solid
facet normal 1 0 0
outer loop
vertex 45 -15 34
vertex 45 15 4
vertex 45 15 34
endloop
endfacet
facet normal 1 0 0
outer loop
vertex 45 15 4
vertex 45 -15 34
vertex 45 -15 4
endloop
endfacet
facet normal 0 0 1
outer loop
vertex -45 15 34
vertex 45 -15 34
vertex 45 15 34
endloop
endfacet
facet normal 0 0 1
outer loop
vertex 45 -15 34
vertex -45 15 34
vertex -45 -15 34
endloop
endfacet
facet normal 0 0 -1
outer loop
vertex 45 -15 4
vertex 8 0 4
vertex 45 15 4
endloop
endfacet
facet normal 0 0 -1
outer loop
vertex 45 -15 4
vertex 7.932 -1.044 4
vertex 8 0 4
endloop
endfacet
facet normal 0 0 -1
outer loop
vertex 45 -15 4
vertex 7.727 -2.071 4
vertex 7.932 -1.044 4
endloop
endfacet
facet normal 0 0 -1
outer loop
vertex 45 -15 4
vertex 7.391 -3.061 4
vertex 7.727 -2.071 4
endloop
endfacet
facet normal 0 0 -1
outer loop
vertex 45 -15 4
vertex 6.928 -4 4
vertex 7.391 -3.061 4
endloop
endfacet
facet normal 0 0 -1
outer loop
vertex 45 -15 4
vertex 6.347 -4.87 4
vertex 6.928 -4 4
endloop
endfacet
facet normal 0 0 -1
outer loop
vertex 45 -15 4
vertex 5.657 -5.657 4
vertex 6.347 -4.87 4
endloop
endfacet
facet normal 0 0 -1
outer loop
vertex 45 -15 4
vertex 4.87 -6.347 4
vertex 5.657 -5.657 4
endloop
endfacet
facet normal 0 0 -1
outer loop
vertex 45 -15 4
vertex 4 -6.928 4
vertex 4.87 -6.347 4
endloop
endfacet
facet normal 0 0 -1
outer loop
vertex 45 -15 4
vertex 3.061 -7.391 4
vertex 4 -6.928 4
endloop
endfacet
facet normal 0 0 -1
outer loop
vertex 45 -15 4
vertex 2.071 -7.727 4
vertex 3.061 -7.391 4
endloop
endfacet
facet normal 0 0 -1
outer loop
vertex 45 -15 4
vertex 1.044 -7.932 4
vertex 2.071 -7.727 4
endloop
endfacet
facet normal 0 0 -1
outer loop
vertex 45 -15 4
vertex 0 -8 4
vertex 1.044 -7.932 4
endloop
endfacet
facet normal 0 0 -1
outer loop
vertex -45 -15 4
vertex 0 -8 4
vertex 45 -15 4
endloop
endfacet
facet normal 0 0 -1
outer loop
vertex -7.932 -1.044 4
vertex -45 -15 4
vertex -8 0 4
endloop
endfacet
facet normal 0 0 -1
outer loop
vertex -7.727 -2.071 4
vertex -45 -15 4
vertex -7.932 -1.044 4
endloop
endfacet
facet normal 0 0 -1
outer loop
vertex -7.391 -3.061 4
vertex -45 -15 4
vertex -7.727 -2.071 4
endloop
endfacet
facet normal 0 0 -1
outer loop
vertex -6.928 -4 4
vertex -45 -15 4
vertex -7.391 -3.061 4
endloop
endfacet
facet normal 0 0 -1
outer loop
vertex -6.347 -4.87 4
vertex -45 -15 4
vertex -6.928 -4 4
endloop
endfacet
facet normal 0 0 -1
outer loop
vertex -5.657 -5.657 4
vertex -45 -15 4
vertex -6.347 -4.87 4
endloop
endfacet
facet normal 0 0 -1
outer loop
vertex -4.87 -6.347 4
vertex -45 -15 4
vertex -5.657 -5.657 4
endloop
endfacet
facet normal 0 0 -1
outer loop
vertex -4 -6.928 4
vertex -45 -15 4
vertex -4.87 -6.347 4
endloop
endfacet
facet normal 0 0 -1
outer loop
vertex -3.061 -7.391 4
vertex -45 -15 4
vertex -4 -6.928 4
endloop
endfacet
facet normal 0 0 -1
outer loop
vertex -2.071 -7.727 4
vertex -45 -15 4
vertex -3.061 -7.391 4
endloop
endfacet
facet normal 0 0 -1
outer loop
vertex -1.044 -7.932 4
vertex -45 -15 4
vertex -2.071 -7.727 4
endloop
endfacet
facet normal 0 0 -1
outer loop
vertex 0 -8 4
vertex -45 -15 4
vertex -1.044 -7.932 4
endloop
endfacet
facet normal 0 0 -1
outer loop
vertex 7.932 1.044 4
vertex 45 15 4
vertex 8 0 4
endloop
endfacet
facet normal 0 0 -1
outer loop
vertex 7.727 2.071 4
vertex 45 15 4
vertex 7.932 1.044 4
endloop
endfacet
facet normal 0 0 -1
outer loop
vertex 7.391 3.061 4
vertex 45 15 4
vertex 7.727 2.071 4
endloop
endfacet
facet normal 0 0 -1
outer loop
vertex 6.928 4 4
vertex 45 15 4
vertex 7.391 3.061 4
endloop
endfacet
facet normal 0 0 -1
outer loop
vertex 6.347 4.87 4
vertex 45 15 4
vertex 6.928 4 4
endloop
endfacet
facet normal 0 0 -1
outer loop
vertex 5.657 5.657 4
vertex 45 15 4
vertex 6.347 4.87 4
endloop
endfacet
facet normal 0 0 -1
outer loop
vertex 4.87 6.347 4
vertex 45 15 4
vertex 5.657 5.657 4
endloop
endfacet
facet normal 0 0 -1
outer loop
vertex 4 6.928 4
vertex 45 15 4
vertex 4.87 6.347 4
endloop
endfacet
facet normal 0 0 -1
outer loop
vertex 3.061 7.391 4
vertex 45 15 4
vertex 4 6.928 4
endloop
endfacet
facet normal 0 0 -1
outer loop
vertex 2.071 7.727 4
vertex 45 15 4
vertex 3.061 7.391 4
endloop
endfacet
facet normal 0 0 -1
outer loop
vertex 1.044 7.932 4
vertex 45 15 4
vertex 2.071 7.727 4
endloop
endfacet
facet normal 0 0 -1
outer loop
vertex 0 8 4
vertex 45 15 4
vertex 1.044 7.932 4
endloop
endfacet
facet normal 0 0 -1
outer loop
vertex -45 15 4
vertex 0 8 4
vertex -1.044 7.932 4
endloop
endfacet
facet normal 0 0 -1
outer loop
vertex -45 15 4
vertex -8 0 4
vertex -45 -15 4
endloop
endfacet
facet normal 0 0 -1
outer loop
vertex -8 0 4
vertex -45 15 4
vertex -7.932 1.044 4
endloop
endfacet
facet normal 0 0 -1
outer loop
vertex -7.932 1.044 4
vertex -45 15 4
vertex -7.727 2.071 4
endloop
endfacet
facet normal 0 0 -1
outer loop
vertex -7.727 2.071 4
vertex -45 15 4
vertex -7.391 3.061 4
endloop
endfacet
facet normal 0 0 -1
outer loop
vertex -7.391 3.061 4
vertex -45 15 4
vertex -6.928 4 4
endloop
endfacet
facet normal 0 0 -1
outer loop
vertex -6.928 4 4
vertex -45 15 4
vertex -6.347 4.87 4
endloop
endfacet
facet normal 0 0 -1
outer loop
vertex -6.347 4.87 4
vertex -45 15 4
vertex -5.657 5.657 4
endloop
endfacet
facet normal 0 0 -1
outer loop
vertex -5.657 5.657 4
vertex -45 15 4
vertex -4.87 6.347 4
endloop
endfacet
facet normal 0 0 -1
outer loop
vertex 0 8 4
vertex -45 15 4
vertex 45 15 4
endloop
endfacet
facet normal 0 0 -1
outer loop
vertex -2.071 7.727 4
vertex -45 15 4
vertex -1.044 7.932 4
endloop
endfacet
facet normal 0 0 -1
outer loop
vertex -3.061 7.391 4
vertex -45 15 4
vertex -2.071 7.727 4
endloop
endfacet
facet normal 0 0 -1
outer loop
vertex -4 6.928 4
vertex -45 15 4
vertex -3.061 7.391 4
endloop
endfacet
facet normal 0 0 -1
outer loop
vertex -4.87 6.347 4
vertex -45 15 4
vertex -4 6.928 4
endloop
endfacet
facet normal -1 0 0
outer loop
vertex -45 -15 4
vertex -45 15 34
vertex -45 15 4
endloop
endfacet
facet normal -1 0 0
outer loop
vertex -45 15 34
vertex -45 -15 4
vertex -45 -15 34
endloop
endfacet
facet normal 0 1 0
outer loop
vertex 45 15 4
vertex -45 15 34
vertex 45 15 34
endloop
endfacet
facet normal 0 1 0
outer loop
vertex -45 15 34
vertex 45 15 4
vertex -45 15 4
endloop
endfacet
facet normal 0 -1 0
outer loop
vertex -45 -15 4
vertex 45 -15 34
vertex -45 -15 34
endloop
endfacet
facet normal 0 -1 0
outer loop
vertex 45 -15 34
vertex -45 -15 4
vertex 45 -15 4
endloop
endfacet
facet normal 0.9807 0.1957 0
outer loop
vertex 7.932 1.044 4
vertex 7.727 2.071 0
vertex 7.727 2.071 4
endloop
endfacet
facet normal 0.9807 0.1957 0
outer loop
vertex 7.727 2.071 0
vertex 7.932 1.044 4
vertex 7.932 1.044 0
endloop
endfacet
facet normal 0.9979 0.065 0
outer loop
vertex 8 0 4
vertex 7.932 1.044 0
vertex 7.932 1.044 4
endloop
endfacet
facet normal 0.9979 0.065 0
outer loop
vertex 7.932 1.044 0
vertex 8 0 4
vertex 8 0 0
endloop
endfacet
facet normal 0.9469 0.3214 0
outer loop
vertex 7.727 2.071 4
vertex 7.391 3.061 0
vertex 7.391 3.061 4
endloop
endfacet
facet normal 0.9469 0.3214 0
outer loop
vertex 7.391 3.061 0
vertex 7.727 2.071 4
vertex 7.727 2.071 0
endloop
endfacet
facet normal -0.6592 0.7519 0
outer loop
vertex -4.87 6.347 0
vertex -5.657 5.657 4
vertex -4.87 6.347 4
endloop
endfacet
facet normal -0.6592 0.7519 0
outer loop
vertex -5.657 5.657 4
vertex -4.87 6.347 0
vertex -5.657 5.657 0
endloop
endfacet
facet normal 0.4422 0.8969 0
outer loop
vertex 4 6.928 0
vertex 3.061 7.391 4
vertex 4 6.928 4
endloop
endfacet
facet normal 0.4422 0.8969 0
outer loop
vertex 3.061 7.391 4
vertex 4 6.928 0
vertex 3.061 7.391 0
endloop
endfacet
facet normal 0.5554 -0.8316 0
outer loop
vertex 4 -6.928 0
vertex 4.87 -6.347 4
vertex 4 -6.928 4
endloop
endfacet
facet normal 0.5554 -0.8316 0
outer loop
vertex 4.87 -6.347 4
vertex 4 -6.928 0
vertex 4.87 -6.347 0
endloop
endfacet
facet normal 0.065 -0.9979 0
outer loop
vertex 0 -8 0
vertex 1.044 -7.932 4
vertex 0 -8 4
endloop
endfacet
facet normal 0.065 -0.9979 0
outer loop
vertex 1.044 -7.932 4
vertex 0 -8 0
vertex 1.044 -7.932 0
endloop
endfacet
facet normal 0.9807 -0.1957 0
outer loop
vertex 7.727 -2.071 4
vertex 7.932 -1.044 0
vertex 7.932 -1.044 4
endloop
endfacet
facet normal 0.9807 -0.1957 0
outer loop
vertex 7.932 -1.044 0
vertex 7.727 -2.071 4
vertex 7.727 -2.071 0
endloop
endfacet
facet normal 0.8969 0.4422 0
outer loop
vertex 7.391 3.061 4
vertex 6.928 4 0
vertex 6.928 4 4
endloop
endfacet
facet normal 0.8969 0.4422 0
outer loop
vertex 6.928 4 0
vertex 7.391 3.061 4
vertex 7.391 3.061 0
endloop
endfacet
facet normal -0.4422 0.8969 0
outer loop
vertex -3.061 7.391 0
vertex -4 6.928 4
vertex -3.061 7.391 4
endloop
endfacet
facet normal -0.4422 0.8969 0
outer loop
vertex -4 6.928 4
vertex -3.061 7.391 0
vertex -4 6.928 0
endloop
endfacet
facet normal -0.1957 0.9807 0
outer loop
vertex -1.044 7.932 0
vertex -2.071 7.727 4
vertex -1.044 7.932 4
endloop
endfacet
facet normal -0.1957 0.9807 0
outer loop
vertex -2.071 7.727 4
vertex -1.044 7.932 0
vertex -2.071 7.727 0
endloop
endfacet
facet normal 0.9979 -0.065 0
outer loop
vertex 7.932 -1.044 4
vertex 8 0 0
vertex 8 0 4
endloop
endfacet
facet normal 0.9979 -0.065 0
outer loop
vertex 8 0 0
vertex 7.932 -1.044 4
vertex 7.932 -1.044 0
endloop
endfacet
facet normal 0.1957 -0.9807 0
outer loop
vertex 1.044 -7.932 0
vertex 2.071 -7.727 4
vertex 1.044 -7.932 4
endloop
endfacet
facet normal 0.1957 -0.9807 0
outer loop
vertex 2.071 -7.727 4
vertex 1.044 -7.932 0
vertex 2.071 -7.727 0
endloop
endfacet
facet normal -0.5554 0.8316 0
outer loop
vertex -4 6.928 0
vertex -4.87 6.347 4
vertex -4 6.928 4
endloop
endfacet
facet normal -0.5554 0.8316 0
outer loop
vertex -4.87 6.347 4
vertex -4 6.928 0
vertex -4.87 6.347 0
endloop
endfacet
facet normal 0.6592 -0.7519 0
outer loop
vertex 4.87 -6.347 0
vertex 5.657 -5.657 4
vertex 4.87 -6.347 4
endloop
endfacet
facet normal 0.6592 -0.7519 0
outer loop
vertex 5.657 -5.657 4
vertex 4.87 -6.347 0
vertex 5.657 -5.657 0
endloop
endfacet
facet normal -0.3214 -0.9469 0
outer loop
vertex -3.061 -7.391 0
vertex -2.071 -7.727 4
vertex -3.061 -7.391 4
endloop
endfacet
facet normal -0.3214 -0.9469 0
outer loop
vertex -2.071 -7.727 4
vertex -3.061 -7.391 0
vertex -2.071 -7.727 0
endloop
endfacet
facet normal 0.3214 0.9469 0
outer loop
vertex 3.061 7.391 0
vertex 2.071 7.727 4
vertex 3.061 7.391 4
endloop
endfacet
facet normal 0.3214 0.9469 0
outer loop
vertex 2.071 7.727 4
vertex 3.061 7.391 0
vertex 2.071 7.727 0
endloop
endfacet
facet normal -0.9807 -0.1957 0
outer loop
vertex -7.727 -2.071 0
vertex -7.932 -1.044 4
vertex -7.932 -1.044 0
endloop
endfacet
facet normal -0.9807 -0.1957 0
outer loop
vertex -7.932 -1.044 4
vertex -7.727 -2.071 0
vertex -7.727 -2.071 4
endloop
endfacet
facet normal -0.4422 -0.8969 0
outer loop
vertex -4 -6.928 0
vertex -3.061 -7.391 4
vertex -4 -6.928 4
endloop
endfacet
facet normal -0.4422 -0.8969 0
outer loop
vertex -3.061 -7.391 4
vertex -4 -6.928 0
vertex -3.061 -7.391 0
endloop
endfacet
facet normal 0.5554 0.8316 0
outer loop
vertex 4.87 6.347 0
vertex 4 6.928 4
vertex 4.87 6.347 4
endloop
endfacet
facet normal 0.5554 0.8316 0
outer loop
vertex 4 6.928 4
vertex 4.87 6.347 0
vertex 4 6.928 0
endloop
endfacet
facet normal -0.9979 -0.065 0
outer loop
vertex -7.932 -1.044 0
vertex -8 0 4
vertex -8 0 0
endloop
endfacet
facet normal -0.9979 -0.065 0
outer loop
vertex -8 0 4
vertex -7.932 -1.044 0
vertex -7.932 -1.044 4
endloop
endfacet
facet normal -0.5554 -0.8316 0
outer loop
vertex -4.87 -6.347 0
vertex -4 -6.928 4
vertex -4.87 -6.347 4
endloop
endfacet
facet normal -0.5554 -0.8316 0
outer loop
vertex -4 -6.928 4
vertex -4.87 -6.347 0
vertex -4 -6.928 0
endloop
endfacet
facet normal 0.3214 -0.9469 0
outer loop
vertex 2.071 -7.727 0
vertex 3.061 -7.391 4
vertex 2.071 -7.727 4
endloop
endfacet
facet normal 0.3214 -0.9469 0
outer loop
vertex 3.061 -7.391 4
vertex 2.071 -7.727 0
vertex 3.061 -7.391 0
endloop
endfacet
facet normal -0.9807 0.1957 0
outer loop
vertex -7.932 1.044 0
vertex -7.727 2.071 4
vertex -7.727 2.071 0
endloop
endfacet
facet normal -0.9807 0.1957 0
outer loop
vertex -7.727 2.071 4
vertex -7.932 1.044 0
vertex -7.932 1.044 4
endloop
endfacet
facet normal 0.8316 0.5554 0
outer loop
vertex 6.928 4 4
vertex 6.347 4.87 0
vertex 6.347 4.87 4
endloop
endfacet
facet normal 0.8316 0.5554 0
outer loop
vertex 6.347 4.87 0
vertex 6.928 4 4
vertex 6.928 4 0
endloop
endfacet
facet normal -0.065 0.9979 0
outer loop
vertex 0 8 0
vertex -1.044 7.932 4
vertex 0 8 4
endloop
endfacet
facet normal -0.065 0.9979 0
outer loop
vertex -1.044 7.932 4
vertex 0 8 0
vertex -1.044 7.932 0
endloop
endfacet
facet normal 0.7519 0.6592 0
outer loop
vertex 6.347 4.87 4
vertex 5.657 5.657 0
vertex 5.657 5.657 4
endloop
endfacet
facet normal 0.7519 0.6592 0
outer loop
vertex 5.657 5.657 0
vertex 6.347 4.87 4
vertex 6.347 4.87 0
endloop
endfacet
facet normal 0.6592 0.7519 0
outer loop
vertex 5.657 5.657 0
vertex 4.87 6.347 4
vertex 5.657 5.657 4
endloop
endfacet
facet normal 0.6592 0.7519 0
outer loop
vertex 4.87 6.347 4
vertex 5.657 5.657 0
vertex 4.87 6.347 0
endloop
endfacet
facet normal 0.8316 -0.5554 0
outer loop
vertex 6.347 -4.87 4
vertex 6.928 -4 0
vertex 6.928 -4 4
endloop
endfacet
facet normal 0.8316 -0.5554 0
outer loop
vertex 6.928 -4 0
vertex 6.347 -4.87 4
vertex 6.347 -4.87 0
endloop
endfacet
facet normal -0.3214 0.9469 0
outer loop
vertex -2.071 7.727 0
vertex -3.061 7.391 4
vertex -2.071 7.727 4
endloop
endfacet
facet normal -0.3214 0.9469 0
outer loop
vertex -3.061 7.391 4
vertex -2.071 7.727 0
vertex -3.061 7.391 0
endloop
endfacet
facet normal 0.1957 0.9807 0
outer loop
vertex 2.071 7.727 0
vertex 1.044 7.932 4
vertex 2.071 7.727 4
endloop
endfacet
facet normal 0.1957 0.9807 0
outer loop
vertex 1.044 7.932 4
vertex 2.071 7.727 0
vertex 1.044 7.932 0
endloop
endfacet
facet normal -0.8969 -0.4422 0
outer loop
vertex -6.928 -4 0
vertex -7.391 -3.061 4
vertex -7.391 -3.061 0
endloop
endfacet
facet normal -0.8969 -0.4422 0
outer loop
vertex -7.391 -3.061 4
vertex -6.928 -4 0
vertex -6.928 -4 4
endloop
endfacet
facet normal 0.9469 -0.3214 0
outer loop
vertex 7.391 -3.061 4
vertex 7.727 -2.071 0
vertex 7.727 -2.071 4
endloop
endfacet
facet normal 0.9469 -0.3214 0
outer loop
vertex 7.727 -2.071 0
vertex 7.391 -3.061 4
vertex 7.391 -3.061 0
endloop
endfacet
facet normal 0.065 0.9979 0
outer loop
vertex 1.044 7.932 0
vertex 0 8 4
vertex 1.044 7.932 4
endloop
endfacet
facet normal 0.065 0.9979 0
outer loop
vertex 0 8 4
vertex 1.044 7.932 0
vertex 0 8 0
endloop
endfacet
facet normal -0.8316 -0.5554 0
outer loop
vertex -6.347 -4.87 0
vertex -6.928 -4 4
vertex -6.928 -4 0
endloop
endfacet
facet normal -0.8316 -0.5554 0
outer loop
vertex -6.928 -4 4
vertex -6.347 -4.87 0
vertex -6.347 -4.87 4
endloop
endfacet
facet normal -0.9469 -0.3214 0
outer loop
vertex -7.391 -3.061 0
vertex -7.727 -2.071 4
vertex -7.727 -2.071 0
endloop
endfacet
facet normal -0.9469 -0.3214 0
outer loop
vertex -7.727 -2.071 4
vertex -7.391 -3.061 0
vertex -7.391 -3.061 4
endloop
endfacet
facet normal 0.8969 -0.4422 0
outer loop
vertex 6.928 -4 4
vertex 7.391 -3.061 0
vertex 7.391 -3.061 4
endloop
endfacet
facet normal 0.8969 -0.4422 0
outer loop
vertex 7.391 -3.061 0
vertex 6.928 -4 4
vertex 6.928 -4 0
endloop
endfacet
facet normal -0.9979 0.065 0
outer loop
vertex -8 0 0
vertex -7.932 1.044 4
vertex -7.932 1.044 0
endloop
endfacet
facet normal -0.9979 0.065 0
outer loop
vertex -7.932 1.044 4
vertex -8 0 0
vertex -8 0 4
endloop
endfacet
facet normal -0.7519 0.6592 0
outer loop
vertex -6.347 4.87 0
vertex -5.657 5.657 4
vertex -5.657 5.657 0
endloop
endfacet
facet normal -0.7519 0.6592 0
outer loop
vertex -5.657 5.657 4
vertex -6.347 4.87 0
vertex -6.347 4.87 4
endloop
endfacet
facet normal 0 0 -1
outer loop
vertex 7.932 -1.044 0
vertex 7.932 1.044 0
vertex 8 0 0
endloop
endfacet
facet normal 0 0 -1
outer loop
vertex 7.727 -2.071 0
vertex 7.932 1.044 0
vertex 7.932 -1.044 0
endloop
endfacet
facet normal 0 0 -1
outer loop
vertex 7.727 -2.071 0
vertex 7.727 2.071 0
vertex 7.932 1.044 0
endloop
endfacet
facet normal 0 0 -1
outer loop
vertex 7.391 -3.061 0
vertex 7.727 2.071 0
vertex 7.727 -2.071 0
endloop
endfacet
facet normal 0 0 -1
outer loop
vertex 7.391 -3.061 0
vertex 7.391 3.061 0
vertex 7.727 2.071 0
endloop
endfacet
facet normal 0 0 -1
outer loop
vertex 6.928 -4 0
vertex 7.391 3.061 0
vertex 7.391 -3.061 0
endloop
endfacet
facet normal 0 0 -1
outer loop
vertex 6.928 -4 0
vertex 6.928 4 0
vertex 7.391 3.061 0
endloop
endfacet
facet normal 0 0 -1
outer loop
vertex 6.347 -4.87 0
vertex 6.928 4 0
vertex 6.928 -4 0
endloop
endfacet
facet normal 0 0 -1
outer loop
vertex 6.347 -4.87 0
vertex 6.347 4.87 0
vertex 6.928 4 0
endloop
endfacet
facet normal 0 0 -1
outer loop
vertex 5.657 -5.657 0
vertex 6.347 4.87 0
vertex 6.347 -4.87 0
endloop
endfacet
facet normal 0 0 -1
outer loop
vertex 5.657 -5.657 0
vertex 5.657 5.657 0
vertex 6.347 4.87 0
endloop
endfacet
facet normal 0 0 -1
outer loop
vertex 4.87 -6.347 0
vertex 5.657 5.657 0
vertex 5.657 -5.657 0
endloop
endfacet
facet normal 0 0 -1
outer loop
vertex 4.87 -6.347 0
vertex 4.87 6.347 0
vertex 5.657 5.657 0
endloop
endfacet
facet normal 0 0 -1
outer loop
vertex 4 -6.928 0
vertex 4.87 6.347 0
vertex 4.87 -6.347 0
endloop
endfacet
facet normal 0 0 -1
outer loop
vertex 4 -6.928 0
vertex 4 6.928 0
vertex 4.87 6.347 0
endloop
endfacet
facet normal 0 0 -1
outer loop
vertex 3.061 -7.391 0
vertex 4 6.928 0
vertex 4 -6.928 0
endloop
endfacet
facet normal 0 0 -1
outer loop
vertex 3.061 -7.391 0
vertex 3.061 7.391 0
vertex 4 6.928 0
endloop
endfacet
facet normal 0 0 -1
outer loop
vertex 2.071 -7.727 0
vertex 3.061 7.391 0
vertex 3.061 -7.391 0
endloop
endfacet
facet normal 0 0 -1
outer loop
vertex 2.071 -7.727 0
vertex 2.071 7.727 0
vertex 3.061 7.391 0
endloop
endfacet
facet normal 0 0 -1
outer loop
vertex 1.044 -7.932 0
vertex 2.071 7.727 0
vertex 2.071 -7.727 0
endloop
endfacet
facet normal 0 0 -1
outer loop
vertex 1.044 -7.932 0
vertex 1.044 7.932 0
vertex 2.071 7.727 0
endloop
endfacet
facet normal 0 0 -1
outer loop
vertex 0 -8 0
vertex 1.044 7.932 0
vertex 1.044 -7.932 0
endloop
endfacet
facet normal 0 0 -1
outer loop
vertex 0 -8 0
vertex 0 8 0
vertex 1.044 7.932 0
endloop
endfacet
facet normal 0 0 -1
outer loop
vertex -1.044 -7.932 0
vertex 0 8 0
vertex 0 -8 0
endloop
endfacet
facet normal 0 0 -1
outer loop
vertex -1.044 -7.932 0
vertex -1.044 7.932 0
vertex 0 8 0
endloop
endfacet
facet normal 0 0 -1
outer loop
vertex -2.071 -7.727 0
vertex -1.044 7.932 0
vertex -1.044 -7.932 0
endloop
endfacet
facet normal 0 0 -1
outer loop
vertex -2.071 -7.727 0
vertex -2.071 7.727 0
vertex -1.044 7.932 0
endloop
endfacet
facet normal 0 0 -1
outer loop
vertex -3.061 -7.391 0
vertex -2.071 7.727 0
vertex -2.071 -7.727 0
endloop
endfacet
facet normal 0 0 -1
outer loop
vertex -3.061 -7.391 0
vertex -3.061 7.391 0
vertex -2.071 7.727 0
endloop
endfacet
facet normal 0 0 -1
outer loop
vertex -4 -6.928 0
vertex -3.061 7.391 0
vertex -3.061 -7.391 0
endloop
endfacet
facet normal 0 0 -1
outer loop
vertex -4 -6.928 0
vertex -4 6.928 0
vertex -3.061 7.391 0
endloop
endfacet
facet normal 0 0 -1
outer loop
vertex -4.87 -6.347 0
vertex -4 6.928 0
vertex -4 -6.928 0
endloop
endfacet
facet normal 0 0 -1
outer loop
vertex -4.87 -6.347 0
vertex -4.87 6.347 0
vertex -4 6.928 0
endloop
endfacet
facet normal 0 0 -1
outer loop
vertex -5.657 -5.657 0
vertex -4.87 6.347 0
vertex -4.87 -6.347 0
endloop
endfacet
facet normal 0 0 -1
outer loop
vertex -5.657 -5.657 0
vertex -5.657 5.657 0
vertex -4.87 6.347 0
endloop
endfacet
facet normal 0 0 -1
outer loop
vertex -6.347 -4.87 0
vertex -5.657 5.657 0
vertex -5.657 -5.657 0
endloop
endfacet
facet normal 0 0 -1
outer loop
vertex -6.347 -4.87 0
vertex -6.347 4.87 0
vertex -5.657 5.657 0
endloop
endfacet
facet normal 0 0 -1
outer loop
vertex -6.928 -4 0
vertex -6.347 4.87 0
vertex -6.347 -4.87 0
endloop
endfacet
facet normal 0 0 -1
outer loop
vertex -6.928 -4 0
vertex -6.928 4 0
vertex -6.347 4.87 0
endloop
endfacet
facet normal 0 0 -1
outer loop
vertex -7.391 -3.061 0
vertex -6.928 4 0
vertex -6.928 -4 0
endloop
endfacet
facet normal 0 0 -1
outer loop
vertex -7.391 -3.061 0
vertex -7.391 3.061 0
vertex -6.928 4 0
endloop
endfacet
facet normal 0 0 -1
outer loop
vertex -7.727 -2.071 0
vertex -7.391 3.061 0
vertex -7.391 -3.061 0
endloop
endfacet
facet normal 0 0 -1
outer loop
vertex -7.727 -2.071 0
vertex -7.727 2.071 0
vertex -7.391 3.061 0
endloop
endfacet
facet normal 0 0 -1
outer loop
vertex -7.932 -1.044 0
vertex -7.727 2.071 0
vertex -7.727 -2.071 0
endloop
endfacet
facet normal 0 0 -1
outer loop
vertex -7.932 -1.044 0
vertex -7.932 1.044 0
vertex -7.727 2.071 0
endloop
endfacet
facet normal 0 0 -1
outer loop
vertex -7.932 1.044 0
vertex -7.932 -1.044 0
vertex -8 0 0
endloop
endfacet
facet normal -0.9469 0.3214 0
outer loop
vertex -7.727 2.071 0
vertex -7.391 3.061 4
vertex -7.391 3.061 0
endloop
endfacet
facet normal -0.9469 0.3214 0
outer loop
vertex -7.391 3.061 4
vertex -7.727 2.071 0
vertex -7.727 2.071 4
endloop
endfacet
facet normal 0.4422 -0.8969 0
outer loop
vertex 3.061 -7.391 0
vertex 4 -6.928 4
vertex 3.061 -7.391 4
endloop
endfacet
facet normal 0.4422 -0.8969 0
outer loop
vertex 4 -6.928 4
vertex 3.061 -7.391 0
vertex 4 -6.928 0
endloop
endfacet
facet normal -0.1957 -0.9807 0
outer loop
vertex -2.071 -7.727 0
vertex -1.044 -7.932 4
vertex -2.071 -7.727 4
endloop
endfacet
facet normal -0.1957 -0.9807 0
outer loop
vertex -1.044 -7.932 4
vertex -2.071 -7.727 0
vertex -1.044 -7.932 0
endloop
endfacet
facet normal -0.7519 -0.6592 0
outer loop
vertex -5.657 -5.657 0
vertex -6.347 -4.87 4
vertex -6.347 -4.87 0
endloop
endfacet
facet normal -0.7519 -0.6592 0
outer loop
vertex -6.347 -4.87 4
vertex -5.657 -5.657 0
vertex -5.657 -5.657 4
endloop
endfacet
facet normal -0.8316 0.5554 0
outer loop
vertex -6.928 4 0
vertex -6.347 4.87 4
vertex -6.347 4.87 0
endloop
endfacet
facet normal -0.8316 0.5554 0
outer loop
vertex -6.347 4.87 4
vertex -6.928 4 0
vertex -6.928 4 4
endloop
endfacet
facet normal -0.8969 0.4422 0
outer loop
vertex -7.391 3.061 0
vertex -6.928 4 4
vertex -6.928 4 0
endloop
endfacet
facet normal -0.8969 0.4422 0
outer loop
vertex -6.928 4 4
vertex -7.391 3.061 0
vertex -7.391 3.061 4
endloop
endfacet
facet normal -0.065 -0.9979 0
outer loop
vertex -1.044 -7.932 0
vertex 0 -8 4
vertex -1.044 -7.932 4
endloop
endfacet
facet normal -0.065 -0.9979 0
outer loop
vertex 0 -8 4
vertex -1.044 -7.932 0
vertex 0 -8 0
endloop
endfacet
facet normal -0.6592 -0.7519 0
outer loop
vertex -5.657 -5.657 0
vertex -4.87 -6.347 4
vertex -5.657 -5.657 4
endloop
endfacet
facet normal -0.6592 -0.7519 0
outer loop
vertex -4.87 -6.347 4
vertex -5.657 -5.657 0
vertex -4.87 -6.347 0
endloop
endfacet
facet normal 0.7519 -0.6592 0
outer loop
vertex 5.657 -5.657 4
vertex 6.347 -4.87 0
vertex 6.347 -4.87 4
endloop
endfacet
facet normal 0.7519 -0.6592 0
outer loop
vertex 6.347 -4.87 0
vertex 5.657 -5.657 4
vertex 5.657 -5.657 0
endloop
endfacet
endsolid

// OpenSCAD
// file: ../webcam/webcam.scad
// A bare webcam: a body and its lens, nothing to stand it on. Drawn looking
// straight down, as a camera added to a site first stands: the middle of the
// lens's front face is the origin, at z = 0, and the body is above it. Its
// long side runs across the picture it takes (+x); the picture's top is +y.
// A camera in a site is this, tilted from straight down about its long side
// and turned about the vertical (apothecary/vision/cameras.py).

body = [90, 30, 30];   // across the picture, up the picture, lens to back
lens_d = 16;           // the lens's diameter
lens_h = 4;            // how far the lens stands out of the body

module webcam() {
    color("dimgray") translate([-body[0] / 2, -body[1] / 2, lens_h]) cube(body);
    color("black") cylinder(d = lens_d, h = lens_h, $fn = 48);
}

webcam();
// main file
// A stub: a webcam on a ceiling mount -- a plate screwed to the ceiling and a
// drop rod, the webcam hanging below it. Only the webcam is drawn for now.

include <../webcam/webcam.scad>
